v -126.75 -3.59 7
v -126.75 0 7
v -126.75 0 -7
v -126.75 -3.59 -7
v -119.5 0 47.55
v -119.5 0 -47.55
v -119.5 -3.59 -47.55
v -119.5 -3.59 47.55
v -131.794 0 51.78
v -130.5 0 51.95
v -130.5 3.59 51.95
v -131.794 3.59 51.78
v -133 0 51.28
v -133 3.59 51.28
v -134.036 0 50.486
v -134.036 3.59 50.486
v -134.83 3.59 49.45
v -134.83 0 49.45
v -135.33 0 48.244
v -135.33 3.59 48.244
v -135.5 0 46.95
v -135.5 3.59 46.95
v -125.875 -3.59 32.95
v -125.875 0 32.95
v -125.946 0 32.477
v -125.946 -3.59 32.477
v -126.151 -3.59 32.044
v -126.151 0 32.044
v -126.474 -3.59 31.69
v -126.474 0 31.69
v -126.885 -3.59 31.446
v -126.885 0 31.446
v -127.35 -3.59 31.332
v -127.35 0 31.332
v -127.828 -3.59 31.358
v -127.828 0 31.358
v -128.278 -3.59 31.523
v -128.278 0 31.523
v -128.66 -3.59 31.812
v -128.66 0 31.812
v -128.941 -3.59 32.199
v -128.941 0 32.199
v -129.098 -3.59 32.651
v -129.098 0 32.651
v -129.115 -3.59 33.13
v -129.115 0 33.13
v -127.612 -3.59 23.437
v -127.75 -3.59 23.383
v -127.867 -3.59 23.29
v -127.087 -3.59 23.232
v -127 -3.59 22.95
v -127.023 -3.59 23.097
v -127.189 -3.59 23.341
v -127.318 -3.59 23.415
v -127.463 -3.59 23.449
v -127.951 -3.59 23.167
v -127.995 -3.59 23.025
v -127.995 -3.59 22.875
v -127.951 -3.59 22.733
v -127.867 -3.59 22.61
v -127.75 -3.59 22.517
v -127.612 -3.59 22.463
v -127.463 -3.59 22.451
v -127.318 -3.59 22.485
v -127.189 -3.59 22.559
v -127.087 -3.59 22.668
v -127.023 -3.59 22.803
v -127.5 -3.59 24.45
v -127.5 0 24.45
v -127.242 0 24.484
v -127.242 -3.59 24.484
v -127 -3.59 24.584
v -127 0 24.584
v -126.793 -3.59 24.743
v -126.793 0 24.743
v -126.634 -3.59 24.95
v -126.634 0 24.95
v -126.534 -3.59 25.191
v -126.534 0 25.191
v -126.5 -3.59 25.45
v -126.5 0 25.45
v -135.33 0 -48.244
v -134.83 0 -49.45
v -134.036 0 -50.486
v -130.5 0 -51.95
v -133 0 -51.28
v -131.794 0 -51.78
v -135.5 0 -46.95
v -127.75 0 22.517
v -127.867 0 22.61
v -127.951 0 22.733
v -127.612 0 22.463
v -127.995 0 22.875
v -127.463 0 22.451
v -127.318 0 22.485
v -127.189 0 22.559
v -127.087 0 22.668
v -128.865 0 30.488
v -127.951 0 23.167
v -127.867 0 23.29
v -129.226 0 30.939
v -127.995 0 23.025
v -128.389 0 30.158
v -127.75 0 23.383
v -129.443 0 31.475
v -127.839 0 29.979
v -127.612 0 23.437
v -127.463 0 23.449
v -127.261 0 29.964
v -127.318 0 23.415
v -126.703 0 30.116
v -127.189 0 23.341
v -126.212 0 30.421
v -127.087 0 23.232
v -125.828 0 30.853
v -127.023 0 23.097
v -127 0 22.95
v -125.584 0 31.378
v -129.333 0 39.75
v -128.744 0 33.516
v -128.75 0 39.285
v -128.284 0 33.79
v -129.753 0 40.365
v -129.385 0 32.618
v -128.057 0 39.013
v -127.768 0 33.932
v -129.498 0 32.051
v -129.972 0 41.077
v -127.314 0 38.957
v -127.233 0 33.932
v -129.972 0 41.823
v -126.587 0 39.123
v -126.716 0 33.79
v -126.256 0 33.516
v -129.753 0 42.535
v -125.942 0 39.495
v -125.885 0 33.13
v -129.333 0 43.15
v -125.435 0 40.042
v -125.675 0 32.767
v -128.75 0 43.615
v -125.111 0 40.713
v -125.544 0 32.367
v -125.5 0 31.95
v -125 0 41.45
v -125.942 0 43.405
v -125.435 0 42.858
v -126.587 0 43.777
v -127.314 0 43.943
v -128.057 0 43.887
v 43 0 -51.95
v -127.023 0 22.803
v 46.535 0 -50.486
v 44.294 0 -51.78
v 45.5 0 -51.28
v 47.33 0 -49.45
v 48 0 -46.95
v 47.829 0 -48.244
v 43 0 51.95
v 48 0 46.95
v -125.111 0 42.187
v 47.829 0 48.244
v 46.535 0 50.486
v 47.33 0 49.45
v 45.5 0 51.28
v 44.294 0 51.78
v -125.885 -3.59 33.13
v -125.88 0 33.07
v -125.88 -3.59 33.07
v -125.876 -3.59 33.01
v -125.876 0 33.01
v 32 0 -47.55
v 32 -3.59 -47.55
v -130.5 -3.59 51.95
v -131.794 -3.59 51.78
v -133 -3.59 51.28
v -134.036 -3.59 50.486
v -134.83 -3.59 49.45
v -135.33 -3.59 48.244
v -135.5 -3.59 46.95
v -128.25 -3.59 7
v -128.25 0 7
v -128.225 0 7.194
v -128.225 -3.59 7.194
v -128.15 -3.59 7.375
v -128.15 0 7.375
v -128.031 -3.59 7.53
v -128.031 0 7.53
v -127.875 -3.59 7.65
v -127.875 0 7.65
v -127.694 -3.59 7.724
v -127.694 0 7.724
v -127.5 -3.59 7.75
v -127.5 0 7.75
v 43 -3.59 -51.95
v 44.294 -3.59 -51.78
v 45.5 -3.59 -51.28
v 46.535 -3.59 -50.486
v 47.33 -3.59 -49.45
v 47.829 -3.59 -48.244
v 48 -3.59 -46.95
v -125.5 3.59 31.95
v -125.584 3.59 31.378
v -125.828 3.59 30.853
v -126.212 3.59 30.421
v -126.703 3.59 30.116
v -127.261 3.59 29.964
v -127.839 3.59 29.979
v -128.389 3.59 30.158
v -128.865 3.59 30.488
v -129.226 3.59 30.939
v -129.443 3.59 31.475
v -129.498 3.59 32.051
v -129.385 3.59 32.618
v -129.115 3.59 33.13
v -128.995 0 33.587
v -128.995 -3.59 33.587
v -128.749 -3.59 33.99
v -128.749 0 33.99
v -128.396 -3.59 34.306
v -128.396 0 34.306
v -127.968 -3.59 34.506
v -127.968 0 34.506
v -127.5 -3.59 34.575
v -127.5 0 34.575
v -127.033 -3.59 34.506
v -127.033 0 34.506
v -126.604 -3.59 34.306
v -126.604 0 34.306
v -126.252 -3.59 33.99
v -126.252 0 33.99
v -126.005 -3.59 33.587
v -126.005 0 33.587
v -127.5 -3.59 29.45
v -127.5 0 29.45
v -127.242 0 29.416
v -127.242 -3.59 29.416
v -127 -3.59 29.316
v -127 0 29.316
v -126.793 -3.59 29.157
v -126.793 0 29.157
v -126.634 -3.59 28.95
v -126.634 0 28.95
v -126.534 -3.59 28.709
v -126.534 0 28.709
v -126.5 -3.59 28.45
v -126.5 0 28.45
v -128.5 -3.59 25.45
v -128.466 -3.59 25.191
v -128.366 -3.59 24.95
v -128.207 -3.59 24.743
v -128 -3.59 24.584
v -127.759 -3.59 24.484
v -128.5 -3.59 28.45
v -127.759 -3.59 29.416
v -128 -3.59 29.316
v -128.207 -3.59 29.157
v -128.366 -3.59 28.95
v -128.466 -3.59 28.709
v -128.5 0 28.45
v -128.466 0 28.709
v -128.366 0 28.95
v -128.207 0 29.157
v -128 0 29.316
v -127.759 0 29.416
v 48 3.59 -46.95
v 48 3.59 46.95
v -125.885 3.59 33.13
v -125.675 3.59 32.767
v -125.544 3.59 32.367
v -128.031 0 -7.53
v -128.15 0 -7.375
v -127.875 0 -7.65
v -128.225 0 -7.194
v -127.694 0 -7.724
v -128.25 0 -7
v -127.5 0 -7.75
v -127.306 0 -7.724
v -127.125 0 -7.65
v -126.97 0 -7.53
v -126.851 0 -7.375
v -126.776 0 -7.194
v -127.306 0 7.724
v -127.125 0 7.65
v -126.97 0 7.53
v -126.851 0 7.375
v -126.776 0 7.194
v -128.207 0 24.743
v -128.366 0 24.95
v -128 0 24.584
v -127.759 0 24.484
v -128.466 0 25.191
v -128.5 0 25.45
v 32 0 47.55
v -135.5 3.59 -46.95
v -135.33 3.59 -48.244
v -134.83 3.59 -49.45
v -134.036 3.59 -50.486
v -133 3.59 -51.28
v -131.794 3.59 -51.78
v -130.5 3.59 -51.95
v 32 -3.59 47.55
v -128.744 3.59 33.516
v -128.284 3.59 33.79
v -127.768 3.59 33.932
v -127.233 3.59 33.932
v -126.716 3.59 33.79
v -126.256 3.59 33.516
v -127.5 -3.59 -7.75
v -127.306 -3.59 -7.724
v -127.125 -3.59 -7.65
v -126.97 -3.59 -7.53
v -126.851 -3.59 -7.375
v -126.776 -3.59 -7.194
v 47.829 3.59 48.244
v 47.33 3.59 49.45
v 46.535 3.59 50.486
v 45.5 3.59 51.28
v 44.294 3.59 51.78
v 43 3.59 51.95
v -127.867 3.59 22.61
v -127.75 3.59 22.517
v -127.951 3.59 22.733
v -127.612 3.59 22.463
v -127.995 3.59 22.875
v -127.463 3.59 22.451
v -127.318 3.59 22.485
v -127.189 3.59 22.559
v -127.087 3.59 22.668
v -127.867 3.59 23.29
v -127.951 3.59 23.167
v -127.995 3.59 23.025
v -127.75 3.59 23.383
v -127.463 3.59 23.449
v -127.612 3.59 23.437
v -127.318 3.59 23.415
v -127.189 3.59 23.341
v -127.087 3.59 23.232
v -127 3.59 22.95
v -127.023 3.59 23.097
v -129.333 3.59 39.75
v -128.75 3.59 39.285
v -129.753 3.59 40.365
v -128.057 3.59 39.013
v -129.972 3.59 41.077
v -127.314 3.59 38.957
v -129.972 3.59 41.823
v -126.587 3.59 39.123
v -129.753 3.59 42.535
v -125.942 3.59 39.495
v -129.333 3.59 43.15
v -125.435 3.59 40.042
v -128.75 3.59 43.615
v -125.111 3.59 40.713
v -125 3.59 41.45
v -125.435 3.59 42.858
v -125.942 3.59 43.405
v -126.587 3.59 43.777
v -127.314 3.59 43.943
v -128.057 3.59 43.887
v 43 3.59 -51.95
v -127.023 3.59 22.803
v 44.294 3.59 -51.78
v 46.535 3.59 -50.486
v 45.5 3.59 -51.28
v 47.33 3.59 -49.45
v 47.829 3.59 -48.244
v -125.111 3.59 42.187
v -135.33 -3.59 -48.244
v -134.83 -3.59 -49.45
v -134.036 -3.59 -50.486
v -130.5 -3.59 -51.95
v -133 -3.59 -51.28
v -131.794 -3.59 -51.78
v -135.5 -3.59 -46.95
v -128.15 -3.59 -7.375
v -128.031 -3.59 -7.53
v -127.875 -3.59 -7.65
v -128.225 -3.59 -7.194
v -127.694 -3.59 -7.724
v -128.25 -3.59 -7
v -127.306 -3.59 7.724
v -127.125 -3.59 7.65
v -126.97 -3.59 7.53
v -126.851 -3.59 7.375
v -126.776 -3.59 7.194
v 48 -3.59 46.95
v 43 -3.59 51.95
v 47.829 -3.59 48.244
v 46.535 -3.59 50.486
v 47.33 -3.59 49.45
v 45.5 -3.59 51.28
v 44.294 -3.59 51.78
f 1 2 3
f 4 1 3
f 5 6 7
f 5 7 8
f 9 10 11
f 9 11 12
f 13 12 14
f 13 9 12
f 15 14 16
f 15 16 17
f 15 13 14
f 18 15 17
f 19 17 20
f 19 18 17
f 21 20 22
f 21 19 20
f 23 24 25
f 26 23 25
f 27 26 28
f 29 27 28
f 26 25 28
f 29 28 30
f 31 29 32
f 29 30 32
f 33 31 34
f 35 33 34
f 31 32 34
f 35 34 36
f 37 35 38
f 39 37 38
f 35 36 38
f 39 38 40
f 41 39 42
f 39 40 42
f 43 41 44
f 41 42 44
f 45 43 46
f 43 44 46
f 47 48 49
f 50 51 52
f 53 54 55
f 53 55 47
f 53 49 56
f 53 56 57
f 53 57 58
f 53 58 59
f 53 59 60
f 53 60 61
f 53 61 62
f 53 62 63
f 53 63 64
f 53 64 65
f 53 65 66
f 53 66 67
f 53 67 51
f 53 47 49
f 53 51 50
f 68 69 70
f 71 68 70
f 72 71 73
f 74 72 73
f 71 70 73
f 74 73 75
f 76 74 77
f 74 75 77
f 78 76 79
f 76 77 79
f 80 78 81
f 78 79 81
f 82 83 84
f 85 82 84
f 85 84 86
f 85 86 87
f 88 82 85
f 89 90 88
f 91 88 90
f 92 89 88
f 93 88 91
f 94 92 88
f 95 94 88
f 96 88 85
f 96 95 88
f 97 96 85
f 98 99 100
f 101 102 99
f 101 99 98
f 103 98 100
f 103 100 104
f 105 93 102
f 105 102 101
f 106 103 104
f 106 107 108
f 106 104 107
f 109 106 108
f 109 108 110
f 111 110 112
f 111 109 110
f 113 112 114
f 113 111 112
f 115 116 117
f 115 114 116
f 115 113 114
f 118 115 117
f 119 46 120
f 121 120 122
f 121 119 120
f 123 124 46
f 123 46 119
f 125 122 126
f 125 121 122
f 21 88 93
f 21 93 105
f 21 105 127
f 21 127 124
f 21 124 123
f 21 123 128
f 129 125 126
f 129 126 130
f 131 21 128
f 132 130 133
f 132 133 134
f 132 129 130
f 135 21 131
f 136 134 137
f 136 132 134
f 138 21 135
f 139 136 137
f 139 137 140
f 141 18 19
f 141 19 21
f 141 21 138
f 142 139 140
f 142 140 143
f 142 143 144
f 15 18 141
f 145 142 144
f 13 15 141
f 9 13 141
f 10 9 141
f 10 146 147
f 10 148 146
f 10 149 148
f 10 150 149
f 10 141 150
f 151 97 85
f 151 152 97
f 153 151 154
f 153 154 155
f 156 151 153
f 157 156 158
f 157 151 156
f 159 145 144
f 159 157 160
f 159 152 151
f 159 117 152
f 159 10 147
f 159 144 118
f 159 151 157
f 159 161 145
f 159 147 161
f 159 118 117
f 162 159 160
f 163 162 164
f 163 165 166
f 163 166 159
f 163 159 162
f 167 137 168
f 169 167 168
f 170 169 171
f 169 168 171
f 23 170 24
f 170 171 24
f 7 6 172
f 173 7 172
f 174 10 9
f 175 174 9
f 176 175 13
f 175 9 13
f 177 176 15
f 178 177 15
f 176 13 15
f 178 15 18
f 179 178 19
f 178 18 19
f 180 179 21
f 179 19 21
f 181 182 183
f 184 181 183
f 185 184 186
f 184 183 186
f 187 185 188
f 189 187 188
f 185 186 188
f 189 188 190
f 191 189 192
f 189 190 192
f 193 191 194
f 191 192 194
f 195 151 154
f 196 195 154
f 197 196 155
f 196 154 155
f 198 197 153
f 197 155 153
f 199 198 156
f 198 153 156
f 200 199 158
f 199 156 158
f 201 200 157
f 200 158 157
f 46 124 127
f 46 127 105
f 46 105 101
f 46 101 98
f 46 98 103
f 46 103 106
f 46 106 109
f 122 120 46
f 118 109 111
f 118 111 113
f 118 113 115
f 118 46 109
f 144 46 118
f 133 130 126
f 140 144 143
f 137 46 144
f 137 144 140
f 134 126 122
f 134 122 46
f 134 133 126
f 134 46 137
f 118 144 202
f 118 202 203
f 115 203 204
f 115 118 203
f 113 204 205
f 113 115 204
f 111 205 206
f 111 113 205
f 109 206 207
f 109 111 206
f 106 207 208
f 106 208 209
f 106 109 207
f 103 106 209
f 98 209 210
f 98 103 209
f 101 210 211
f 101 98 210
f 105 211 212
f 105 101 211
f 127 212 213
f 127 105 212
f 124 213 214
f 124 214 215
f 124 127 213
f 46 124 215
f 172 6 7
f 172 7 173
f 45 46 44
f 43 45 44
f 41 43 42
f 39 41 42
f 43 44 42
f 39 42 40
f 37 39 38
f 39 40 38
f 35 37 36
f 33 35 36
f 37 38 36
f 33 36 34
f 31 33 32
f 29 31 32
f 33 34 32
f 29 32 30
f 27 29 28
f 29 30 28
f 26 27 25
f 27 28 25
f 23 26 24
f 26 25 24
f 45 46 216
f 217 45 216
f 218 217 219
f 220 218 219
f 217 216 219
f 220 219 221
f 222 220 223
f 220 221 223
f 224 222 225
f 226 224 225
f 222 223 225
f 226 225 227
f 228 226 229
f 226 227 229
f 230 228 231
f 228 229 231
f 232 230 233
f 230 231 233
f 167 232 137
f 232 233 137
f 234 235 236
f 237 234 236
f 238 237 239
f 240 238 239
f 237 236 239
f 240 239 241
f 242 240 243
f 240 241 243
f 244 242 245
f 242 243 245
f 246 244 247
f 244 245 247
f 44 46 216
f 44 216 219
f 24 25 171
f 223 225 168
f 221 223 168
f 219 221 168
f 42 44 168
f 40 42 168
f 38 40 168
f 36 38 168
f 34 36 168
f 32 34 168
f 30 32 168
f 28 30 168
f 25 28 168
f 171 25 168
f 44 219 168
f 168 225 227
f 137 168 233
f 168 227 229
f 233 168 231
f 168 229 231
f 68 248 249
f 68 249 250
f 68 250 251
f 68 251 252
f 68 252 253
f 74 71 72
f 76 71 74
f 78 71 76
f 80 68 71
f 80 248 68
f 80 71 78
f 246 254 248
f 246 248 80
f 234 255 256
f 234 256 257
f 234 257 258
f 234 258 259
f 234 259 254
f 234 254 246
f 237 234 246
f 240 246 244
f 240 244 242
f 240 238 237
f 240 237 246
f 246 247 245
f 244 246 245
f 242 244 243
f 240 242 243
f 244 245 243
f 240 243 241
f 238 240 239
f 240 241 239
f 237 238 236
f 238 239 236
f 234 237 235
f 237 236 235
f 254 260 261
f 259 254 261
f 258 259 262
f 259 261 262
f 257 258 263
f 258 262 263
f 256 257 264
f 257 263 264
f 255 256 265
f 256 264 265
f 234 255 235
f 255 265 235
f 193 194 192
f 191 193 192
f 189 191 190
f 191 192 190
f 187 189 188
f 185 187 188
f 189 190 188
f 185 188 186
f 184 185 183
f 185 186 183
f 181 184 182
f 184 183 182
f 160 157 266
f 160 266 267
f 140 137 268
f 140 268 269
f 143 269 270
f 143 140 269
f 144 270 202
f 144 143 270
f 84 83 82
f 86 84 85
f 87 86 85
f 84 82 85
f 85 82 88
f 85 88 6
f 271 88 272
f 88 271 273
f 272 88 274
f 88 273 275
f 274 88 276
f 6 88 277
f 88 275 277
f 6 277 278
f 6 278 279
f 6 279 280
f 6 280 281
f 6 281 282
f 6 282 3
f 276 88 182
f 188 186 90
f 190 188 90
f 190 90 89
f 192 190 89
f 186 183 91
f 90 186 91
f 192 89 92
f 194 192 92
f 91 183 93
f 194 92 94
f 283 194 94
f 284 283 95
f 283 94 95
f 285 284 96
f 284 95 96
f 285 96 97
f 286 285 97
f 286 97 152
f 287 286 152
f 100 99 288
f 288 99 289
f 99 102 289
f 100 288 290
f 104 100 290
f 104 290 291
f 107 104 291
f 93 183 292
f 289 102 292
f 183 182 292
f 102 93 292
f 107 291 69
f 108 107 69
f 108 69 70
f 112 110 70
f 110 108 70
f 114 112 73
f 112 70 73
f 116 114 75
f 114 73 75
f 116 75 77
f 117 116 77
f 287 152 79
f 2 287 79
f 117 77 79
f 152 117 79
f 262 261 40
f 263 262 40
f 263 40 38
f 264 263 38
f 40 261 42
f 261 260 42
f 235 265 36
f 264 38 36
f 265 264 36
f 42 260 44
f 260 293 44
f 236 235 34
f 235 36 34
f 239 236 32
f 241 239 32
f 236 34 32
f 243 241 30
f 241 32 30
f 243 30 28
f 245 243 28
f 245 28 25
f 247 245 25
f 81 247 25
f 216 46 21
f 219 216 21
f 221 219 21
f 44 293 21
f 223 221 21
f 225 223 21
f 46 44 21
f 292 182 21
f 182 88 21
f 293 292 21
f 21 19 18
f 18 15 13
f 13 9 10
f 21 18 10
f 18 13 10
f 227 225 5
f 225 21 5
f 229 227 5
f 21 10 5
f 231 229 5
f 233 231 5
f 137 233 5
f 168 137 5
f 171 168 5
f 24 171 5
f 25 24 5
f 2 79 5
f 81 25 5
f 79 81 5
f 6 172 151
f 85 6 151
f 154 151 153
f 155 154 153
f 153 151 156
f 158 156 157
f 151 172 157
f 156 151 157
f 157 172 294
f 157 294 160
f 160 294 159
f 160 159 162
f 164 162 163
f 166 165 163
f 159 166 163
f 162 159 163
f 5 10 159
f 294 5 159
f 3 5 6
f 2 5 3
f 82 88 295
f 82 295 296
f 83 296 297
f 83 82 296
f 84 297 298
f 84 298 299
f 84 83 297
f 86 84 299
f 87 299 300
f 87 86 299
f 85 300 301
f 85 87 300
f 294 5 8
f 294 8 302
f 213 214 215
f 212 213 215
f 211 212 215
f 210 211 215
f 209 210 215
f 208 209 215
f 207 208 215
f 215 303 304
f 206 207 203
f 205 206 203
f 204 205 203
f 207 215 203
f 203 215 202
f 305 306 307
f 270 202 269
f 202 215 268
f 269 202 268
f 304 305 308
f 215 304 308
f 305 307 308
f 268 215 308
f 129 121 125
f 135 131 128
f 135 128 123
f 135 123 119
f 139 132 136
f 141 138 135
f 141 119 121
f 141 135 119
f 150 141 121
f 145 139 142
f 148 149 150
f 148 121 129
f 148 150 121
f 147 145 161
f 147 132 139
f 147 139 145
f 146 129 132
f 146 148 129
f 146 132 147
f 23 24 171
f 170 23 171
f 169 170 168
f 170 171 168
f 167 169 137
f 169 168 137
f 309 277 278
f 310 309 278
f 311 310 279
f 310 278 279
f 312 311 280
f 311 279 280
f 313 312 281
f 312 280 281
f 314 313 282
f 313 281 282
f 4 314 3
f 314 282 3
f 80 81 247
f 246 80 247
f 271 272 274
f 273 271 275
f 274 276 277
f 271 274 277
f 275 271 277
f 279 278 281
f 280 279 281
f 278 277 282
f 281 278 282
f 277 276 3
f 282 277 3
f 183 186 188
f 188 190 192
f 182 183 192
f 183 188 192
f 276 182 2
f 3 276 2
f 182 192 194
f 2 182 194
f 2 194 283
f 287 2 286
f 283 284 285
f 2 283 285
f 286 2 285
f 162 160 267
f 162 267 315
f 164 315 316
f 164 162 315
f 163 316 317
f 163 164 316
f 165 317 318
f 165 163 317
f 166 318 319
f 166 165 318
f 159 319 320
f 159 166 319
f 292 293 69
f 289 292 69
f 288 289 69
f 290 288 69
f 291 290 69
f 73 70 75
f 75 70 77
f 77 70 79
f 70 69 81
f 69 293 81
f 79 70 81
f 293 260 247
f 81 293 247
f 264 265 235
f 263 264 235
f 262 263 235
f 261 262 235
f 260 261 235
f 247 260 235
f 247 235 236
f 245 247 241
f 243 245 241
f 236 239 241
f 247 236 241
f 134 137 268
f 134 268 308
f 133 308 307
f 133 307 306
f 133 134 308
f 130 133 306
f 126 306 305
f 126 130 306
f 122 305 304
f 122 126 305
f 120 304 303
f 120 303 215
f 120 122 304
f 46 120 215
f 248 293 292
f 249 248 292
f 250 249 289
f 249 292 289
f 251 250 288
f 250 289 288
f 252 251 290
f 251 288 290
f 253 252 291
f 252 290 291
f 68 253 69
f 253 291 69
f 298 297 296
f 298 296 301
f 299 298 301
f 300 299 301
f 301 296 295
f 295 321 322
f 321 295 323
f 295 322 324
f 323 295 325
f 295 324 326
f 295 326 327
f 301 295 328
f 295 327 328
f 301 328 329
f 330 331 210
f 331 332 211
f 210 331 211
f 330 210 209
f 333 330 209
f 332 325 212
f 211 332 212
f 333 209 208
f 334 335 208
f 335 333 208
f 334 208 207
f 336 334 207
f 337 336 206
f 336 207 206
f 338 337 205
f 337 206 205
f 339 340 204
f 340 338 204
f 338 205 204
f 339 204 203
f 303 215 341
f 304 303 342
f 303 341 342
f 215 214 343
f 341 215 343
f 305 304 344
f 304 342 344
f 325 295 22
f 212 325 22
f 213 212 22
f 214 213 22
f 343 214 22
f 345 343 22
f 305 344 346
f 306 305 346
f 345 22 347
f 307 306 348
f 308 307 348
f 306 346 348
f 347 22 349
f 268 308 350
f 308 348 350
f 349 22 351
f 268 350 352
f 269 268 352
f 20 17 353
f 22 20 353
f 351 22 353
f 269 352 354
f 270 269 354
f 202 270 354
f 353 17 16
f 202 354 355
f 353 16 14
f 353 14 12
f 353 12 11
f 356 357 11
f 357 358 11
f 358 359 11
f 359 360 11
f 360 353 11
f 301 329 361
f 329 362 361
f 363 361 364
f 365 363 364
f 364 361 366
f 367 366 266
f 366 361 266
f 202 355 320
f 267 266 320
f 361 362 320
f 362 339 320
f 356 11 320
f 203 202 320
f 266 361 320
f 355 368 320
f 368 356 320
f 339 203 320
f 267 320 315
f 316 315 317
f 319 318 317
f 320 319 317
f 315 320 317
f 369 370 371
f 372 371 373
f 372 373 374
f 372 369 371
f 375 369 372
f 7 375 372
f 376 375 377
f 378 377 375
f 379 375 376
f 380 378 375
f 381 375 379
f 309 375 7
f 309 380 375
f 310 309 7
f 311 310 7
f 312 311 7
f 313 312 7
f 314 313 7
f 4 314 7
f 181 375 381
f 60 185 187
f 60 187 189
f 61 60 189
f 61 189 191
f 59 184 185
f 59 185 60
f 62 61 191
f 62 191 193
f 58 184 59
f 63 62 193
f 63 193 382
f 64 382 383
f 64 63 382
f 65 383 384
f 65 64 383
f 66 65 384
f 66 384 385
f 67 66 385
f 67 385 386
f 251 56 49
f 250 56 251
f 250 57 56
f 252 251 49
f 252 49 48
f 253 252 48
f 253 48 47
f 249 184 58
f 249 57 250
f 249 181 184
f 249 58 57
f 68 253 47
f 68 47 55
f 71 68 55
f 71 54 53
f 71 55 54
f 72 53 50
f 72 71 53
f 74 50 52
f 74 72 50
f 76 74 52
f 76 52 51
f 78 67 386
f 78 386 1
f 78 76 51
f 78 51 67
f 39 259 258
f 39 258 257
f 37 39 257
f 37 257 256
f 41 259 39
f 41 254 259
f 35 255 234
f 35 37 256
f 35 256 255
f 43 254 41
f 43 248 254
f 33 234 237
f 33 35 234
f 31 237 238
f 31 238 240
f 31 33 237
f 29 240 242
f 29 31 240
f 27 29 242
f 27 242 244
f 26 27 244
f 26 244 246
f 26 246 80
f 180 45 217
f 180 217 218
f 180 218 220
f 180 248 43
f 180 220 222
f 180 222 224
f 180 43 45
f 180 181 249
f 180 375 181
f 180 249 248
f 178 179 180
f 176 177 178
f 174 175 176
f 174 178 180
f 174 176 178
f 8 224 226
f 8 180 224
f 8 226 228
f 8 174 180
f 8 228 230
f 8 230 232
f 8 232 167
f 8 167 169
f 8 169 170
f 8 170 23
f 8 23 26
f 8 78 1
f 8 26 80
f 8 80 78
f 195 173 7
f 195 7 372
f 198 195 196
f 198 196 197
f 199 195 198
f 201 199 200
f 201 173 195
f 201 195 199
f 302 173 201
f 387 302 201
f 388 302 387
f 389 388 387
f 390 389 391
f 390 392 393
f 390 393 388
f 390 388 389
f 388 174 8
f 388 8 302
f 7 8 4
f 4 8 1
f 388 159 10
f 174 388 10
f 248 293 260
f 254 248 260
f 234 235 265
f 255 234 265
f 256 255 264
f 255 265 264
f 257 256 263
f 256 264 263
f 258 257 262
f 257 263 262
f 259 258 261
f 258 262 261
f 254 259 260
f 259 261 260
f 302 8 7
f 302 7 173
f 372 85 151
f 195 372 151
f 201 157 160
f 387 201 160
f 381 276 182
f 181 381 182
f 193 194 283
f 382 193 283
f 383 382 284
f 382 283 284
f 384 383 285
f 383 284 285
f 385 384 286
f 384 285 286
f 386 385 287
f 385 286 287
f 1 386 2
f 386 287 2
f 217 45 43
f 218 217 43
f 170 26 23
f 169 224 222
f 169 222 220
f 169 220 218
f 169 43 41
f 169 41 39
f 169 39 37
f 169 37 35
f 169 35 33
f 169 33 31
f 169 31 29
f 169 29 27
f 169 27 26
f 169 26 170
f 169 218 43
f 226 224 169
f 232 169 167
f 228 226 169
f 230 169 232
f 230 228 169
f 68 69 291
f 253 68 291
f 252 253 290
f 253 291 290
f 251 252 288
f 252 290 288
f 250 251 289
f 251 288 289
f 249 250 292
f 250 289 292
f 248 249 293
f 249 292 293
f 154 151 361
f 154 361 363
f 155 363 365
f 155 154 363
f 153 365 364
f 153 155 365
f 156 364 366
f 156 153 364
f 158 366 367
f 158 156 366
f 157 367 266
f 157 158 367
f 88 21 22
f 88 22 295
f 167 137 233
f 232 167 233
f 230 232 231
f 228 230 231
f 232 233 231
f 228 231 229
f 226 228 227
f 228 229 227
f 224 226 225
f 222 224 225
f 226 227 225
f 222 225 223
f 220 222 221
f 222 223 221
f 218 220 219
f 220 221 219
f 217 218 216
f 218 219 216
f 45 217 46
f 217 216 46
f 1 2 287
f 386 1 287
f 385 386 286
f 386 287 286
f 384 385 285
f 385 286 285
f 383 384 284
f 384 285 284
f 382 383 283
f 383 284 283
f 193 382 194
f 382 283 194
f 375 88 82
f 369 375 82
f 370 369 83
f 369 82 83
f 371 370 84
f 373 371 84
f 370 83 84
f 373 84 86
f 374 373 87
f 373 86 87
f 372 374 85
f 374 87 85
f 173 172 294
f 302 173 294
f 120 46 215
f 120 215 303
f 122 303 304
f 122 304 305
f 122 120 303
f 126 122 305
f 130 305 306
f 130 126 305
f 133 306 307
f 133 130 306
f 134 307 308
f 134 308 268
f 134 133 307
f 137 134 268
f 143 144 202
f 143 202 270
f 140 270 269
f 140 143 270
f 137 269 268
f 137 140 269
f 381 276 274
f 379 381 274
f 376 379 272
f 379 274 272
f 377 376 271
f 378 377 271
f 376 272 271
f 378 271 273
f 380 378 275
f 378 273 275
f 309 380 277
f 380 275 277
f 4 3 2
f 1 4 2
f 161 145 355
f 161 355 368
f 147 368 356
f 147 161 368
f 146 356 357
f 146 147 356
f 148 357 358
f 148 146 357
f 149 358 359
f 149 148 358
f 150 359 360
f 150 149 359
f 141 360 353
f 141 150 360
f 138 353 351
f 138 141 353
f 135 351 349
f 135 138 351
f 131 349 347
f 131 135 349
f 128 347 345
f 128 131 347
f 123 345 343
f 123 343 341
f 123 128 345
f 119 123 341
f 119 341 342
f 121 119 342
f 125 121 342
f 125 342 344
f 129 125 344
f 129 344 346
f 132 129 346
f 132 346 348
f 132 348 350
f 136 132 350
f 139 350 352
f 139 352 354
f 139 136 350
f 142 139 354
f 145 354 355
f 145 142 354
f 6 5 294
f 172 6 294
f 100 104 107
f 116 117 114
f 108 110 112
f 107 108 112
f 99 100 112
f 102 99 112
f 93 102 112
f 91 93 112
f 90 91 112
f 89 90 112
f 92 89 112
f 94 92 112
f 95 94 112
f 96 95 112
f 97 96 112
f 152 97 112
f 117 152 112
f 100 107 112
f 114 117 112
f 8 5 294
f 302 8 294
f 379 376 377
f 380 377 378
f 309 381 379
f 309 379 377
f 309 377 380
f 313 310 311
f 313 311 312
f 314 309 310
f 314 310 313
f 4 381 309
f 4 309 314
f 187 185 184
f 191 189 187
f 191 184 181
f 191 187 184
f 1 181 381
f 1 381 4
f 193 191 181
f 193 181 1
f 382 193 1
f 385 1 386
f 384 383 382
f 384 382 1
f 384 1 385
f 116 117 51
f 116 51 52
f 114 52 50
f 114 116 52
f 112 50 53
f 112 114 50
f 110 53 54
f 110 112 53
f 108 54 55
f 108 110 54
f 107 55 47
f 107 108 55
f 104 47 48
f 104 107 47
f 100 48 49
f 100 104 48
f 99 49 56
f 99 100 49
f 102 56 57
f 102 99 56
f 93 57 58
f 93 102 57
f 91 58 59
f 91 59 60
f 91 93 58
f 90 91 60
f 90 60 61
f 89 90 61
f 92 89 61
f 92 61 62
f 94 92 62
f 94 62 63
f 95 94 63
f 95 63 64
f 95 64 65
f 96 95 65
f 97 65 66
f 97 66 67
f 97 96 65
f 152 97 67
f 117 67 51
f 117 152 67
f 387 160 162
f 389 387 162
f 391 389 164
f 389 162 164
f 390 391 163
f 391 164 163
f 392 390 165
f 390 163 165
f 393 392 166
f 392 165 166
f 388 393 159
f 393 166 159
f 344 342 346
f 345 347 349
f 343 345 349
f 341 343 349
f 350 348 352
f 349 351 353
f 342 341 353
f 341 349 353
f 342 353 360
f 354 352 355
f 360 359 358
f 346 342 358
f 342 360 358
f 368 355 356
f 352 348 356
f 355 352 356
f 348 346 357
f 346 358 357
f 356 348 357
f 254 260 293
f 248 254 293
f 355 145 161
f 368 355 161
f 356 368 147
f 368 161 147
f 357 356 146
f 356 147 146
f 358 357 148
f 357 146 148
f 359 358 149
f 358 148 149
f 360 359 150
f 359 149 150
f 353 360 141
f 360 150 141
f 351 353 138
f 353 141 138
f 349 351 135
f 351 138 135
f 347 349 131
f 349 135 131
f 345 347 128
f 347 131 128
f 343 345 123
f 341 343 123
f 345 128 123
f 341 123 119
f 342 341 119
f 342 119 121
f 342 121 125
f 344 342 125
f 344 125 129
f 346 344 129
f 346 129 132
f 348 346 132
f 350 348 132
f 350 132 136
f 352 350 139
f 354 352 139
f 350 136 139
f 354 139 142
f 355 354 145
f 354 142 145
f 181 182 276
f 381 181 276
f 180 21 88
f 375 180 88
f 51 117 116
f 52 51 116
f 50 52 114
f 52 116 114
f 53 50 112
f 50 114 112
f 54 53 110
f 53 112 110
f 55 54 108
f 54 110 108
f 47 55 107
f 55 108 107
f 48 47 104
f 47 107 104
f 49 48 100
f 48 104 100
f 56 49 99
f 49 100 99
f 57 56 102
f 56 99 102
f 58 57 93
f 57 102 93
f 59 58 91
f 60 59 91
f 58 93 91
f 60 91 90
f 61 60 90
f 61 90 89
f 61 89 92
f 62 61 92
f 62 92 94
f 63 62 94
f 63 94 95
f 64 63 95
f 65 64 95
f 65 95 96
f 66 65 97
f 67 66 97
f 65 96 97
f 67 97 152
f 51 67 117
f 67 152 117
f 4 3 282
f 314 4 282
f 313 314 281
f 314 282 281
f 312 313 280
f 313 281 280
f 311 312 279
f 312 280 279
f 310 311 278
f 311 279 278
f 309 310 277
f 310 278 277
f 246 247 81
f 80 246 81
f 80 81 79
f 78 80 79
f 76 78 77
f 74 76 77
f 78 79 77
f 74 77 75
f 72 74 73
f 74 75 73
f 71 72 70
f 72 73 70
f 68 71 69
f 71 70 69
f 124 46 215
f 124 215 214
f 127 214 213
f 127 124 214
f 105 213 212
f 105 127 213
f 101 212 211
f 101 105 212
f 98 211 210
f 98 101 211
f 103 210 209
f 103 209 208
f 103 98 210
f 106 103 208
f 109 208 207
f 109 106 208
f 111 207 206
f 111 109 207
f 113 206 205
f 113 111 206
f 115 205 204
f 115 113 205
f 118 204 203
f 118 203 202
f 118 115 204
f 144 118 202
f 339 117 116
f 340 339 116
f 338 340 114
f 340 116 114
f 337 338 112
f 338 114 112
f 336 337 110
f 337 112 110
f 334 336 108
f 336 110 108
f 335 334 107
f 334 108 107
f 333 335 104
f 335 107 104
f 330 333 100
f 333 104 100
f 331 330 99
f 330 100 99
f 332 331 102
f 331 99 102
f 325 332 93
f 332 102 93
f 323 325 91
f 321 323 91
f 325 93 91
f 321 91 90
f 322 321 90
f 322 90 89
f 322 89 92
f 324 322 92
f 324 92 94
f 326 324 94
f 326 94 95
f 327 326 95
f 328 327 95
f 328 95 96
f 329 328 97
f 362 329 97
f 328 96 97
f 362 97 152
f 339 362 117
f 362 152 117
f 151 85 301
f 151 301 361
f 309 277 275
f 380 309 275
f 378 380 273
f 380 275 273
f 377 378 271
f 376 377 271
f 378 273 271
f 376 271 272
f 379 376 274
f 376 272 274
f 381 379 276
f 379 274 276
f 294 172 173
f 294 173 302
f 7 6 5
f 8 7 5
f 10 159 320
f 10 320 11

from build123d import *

# Parameters (mm, degrees)
F0_R     = 0.5
F0_R_2   = 2.5
F0_W     = 151.5
F0_H     = 95.1
F1_DEPTH = 3.59
F2_DEPTH = 3.59
F3_DEPTH = 3.59
F4_DEPTH = 3.59


with BuildPart() as f1:
    # F0 (on Front) → F1 (new body)
    with BuildSketch(Plane.XZ):
        with BuildLine():
            Line((42.9996596575, 51.95), (-130.5003403425, 51.95))
            ThreePointArc((-130.5003403425, 51.95), (-134.0358742485, 50.4855339059), (-135.5003403425, 46.95))
            Line((-135.5003403425, 46.95), (-135.5003403425, -46.95))
            ThreePointArc((-135.5003403425, -46.95), (-134.0358742485, -50.4855339059), (-130.5003403425, -51.95))
            Line((-130.5003403425, -51.95), (42.9996596575, -51.95))
            ThreePointArc((42.9996596575, -51.95), (46.5351935634, -50.4855339059), (47.9996596575, -46.95))
            Line((47.9996596575, -46.95), (47.9996596575, 46.95))
            ThreePointArc((47.9996596575, 46.95), (46.5351935634, 50.4855339059), (42.9996596575, 51.95))
        make_face()
        with BuildLine():
            Line((-126.7503403425, 7), (-126.7503403425, -7))
            ThreePointArc((-126.7503403425, -7), (-126.9700102566, -7.5303300859), (-127.5003403425, -7.75))
            ThreePointArc((-127.5003403425, -7.75), (-128.0306704284, -7.5303300859), (-128.2503403425, -7))
            Line((-128.2503403425, -7), (-128.2503403425, 7))
            ThreePointArc((-128.2503403425, 7), (-128.0306704284, 7.5303300859), (-127.5003403425, 7.75))
            ThreePointArc((-127.5003403425, 7.75), (-126.9700102566, 7.5303300859), (-126.7503403425, 7))
        make_face(mode=Mode.SUBTRACT)
        with Locations((-127.5003403425, 22.95)):
            Circle(F0_R, mode=Mode.SUBTRACT)
        with BuildLine():
            Line((-126.5003403425, 28.45), (-126.5003403425, 25.45))
            ThreePointArc((-126.5003403425, 25.45), (-126.7932335613, 24.7428932188), (-127.5003403425, 24.45))
            ThreePointArc((-127.5003403425, 24.45), (-128.2074471237, 24.7428932188), (-128.5003403425, 25.45))
            Line((-128.5003403425, 25.45), (-128.5003403425, 28.45))
            ThreePointArc((-128.5003403425, 28.45), (-128.2074471237, 29.1571067812), (-127.5003403425, 29.45))
            ThreePointArc((-127.5003403425, 29.45), (-126.7932335613, 29.1571067812), (-126.5003403425, 28.45))
        make_face(mode=Mode.SUBTRACT)
        with BuildLine():
            ThreePointArc((-129.1153751416, 33.1296875), (-127.5003403425, 34.575), (-125.8853055434, 33.1296875))
            ThreePointArc((-125.8853055434, 33.1296875), (-125.599015857, 32.5704556397), (-125.5003403425, 31.95))
            ThreePointArc((-125.5003403425, 31.95), (-128.1207959823, 30.0486755145), (-129.1153751416, 33.1296875))
        make_face(mode=Mode.SUBTRACT)
        with Locations((-127.5003403425, 41.45)):
            Circle(F0_R_2, mode=Mode.SUBTRACT)
        with Locations((-43.7503403425, 0)):
            Rectangle(F0_W, F0_H, mode=Mode.SUBTRACT)
        with Locations((-127.5003403425, 41.45)):
            Circle(F0_R_2)
        with BuildLine():
            ThreePointArc((-125.8853055434, 33.1296875), (-125.8778335554, 33.0399818077), (-125.8753403425, 32.95))
            ThreePointArc((-125.8753403425, 32.95), (-127.5903221502, 31.3274932129), (-129.1153751416, 33.1296875))
            ThreePointArc((-129.1153751416, 33.1296875), (-128.1207959823, 30.0486755145), (-125.5003403425, 31.95))
            ThreePointArc((-125.5003403425, 31.95), (-125.599015857, 32.5704556397), (-125.8853055434, 33.1296875))
        make_face()
    extrude(amount=F1_DEPTH)


with BuildPart() as f2:
    # F0 (on Front) → F2 (new body, through all)
    with BuildSketch(Plane.XZ):
        with BuildLine():
            ThreePointArc((-129.1153751416, 33.1296875), (-127.5003403425, 33.95), (-125.8853055434, 33.1296875))
            ThreePointArc((-125.8853055434, 33.1296875), (-127.5003403425, 34.575), (-129.1153751416, 33.1296875))
        make_face()
        with BuildLine():
            ThreePointArc((-129.1153751416, 33.1296875), (-127.5903221502, 31.3274932129), (-125.8753403425, 32.95))
            ThreePointArc((-125.8753403425, 32.95), (-125.8778335554, 33.0399818077), (-125.8853055434, 33.1296875))
            ThreePointArc((-125.8853055434, 33.1296875), (-127.5003403425, 33.95), (-129.1153751416, 33.1296875))
        make_face()
    extrude(amount=F2_DEPTH)


with BuildPart() as f2b:
    # F0 (on Front) → F2, piece 2 (new body, through all)
    with BuildSketch(Plane.XZ):
        with BuildLine():
            ThreePointArc((-127.5003403425, 24.45), (-126.7932335613, 24.7428932188), (-126.5003403425, 25.45))
            Line((-126.5003403425, 25.45), (-126.5003403425, 28.45))
            ThreePointArc((-126.5003403425, 28.45), (-126.7932335613, 29.1571067812), (-127.5003403425, 29.45))
            ThreePointArc((-127.5003403425, 29.45), (-128.2074471237, 29.1571067812), (-128.5003403425, 28.45))
            Line((-128.5003403425, 28.45), (-128.5003403425, 25.45))
            ThreePointArc((-128.5003403425, 25.45), (-128.2074471237, 24.7428932188), (-127.5003403425, 24.45))
        make_face()
    extrude(amount=F2_DEPTH)


with BuildPart() as f2c:
    # F0 (on Front) → F2, piece 3 (new body, through all)
    with BuildSketch(Plane.XZ):
        with Locations((-43.7503403425, 0)):
            Rectangle(F0_W, F0_H)
    extrude(amount=F2_DEPTH)


with BuildPart() as f2d:
    # F0 (on Front) → F2, piece 4 (new body, through all)
    with BuildSketch(Plane.XZ):
        with BuildLine():
            ThreePointArc((-127.5003403425, -7.75), (-126.9700102566, -7.5303300859), (-126.7503403425, -7))
            Line((-126.7503403425, -7), (-126.7503403425, 7))
            ThreePointArc((-126.7503403425, 7), (-126.9700102566, 7.5303300859), (-127.5003403425, 7.75))
            ThreePointArc((-127.5003403425, 7.75), (-128.0306704284, 7.5303300859), (-128.2503403425, 7))
            Line((-128.2503403425, 7), (-128.2503403425, -7))
            ThreePointArc((-128.2503403425, -7), (-128.0306704284, -7.5303300859), (-127.5003403425, -7.75))
        make_face()
    extrude(amount=F2_DEPTH)


with BuildPart() as f2e:
    # F0 (on Front) → F2, piece 5 (new body, through all)
    with BuildSketch(Plane.XZ):
        with Locations((-127.5003403425, 22.95)):
            Circle(F0_R)
    extrude(amount=F2_DEPTH)


with BuildPart() as f3:
    # F0 (on Front) → F3 (new body)
    with BuildSketch(Plane.XZ):
        with BuildLine():
            Line((42.9996596575, 51.95), (-130.5003403425, 51.95))
            ThreePointArc((-130.5003403425, 51.95), (-134.0358742485, 50.4855339059), (-135.5003403425, 46.95))
            Line((-135.5003403425, 46.95), (-135.5003403425, -46.95))
            ThreePointArc((-135.5003403425, -46.95), (-134.0358742485, -50.4855339059), (-130.5003403425, -51.95))
            Line((-130.5003403425, -51.95), (42.9996596575, -51.95))
            ThreePointArc((42.9996596575, -51.95), (46.5351935634, -50.4855339059), (47.9996596575, -46.95))
            Line((47.9996596575, -46.95), (47.9996596575, 46.95))
            ThreePointArc((47.9996596575, 46.95), (46.5351935634, 50.4855339059), (42.9996596575, 51.95))
        make_face()
        with BuildLine():
            Line((-126.7503403425, 7), (-126.7503403425, -7))
            ThreePointArc((-126.7503403425, -7), (-126.9700102566, -7.5303300859), (-127.5003403425, -7.75))
            ThreePointArc((-127.5003403425, -7.75), (-128.0306704284, -7.5303300859), (-128.2503403425, -7))
            Line((-128.2503403425, -7), (-128.2503403425, 7))
            ThreePointArc((-128.2503403425, 7), (-128.0306704284, 7.5303300859), (-127.5003403425, 7.75))
            ThreePointArc((-127.5003403425, 7.75), (-126.9700102566, 7.5303300859), (-126.7503403425, 7))
        make_face(mode=Mode.SUBTRACT)
        with Locations((-127.5003403425, 22.95)):
            Circle(F0_R, mode=Mode.SUBTRACT)
        with BuildLine():
            Line((-126.5003403425, 28.45), (-126.5003403425, 25.45))
            ThreePointArc((-126.5003403425, 25.45), (-126.7932335613, 24.7428932188), (-127.5003403425, 24.45))
            ThreePointArc((-127.5003403425, 24.45), (-128.2074471237, 24.7428932188), (-128.5003403425, 25.45))
            Line((-128.5003403425, 25.45), (-128.5003403425, 28.45))
            ThreePointArc((-128.5003403425, 28.45), (-128.2074471237, 29.1571067812), (-127.5003403425, 29.45))
            ThreePointArc((-127.5003403425, 29.45), (-126.7932335613, 29.1571067812), (-126.5003403425, 28.45))
        make_face(mode=Mode.SUBTRACT)
        with BuildLine():
            ThreePointArc((-129.1153751416, 33.1296875), (-127.5003403425, 34.575), (-125.8853055434, 33.1296875))
            ThreePointArc((-125.8853055434, 33.1296875), (-125.599015857, 32.5704556397), (-125.5003403425, 31.95))
            ThreePointArc((-125.5003403425, 31.95), (-128.1207959823, 30.0486755145), (-129.1153751416, 33.1296875))
        make_face(mode=Mode.SUBTRACT)
        with Locations((-127.5003403425, 41.45)):
            Circle(F0_R_2, mode=Mode.SUBTRACT)
        with Locations((-43.7503403425, 0)):
            Rectangle(F0_W, F0_H, mode=Mode.SUBTRACT)
        with Locations((-43.7503403425, 0)):
            Rectangle(F0_W, F0_H)
        with BuildLine():
            ThreePointArc((-127.5003403425, -7.75), (-126.9700102566, -7.5303300859), (-126.7503403425, -7))
            Line((-126.7503403425, -7), (-126.7503403425, 7))
            ThreePointArc((-126.7503403425, 7), (-126.9700102566, 7.5303300859), (-127.5003403425, 7.75))
            ThreePointArc((-127.5003403425, 7.75), (-128.0306704284, 7.5303300859), (-128.2503403425, 7))
            Line((-128.2503403425, 7), (-128.2503403425, -7))
            ThreePointArc((-128.2503403425, -7), (-128.0306704284, -7.5303300859), (-127.5003403425, -7.75))
        make_face()
        with BuildLine():
            ThreePointArc((-127.5003403425, 24.45), (-126.7932335613, 24.7428932188), (-126.5003403425, 25.45))
            Line((-126.5003403425, 25.45), (-126.5003403425, 28.45))
            ThreePointArc((-126.5003403425, 28.45), (-126.7932335613, 29.1571067812), (-127.5003403425, 29.45))
            ThreePointArc((-127.5003403425, 29.45), (-128.2074471237, 29.1571067812), (-128.5003403425, 28.45))
            Line((-128.5003403425, 28.45), (-128.5003403425, 25.45))
            ThreePointArc((-128.5003403425, 25.45), (-128.2074471237, 24.7428932188), (-127.5003403425, 24.45))
        make_face()
        with BuildLine():
            ThreePointArc((-129.1153751416, 33.1296875), (-127.5003403425, 33.95), (-125.8853055434, 33.1296875))
            ThreePointArc((-125.8853055434, 33.1296875), (-127.5003403425, 34.575), (-129.1153751416, 33.1296875))
        make_face()
    extrude(amount=-F3_DEPTH)


with BuildPart() as f4:
    # F0 (on Front) → F4 (new body, through all)
    with BuildSketch(Plane.XZ):
        with Locations((-127.5003403425, 41.45)):
            Circle(F0_R_2)
    extrude(amount=-F4_DEPTH)


with BuildPart() as f4b:
    # F0 (on Front) → F4, piece 2 (new body, through all)
    with BuildSketch(Plane.XZ):
        with BuildLine():
            ThreePointArc((-125.8853055434, 33.1296875), (-125.8778335554, 33.0399818077), (-125.8753403425, 32.95))
            ThreePointArc((-125.8753403425, 32.95), (-127.5903221502, 31.3274932129), (-129.1153751416, 33.1296875))
            ThreePointArc((-129.1153751416, 33.1296875), (-128.1207959823, 30.0486755145), (-125.5003403425, 31.95))
            ThreePointArc((-125.5003403425, 31.95), (-125.599015857, 32.5704556397), (-125.8853055434, 33.1296875))
        make_face()
        with BuildLine():
            ThreePointArc((-129.1153751416, 33.1296875), (-127.5903221502, 31.3274932129), (-125.8753403425, 32.95))
            ThreePointArc((-125.8753403425, 32.95), (-125.8778335554, 33.0399818077), (-125.8853055434, 33.1296875))
            ThreePointArc((-125.8853055434, 33.1296875), (-127.5003403425, 33.95), (-129.1153751416, 33.1296875))
        make_face()
    extrude(amount=-F4_DEPTH)


solid = Compound([f1.part, f2.part, f2b.part, f2c.part, f2d.part, f2e.part, f3.part, f4.part, f4b.part])
